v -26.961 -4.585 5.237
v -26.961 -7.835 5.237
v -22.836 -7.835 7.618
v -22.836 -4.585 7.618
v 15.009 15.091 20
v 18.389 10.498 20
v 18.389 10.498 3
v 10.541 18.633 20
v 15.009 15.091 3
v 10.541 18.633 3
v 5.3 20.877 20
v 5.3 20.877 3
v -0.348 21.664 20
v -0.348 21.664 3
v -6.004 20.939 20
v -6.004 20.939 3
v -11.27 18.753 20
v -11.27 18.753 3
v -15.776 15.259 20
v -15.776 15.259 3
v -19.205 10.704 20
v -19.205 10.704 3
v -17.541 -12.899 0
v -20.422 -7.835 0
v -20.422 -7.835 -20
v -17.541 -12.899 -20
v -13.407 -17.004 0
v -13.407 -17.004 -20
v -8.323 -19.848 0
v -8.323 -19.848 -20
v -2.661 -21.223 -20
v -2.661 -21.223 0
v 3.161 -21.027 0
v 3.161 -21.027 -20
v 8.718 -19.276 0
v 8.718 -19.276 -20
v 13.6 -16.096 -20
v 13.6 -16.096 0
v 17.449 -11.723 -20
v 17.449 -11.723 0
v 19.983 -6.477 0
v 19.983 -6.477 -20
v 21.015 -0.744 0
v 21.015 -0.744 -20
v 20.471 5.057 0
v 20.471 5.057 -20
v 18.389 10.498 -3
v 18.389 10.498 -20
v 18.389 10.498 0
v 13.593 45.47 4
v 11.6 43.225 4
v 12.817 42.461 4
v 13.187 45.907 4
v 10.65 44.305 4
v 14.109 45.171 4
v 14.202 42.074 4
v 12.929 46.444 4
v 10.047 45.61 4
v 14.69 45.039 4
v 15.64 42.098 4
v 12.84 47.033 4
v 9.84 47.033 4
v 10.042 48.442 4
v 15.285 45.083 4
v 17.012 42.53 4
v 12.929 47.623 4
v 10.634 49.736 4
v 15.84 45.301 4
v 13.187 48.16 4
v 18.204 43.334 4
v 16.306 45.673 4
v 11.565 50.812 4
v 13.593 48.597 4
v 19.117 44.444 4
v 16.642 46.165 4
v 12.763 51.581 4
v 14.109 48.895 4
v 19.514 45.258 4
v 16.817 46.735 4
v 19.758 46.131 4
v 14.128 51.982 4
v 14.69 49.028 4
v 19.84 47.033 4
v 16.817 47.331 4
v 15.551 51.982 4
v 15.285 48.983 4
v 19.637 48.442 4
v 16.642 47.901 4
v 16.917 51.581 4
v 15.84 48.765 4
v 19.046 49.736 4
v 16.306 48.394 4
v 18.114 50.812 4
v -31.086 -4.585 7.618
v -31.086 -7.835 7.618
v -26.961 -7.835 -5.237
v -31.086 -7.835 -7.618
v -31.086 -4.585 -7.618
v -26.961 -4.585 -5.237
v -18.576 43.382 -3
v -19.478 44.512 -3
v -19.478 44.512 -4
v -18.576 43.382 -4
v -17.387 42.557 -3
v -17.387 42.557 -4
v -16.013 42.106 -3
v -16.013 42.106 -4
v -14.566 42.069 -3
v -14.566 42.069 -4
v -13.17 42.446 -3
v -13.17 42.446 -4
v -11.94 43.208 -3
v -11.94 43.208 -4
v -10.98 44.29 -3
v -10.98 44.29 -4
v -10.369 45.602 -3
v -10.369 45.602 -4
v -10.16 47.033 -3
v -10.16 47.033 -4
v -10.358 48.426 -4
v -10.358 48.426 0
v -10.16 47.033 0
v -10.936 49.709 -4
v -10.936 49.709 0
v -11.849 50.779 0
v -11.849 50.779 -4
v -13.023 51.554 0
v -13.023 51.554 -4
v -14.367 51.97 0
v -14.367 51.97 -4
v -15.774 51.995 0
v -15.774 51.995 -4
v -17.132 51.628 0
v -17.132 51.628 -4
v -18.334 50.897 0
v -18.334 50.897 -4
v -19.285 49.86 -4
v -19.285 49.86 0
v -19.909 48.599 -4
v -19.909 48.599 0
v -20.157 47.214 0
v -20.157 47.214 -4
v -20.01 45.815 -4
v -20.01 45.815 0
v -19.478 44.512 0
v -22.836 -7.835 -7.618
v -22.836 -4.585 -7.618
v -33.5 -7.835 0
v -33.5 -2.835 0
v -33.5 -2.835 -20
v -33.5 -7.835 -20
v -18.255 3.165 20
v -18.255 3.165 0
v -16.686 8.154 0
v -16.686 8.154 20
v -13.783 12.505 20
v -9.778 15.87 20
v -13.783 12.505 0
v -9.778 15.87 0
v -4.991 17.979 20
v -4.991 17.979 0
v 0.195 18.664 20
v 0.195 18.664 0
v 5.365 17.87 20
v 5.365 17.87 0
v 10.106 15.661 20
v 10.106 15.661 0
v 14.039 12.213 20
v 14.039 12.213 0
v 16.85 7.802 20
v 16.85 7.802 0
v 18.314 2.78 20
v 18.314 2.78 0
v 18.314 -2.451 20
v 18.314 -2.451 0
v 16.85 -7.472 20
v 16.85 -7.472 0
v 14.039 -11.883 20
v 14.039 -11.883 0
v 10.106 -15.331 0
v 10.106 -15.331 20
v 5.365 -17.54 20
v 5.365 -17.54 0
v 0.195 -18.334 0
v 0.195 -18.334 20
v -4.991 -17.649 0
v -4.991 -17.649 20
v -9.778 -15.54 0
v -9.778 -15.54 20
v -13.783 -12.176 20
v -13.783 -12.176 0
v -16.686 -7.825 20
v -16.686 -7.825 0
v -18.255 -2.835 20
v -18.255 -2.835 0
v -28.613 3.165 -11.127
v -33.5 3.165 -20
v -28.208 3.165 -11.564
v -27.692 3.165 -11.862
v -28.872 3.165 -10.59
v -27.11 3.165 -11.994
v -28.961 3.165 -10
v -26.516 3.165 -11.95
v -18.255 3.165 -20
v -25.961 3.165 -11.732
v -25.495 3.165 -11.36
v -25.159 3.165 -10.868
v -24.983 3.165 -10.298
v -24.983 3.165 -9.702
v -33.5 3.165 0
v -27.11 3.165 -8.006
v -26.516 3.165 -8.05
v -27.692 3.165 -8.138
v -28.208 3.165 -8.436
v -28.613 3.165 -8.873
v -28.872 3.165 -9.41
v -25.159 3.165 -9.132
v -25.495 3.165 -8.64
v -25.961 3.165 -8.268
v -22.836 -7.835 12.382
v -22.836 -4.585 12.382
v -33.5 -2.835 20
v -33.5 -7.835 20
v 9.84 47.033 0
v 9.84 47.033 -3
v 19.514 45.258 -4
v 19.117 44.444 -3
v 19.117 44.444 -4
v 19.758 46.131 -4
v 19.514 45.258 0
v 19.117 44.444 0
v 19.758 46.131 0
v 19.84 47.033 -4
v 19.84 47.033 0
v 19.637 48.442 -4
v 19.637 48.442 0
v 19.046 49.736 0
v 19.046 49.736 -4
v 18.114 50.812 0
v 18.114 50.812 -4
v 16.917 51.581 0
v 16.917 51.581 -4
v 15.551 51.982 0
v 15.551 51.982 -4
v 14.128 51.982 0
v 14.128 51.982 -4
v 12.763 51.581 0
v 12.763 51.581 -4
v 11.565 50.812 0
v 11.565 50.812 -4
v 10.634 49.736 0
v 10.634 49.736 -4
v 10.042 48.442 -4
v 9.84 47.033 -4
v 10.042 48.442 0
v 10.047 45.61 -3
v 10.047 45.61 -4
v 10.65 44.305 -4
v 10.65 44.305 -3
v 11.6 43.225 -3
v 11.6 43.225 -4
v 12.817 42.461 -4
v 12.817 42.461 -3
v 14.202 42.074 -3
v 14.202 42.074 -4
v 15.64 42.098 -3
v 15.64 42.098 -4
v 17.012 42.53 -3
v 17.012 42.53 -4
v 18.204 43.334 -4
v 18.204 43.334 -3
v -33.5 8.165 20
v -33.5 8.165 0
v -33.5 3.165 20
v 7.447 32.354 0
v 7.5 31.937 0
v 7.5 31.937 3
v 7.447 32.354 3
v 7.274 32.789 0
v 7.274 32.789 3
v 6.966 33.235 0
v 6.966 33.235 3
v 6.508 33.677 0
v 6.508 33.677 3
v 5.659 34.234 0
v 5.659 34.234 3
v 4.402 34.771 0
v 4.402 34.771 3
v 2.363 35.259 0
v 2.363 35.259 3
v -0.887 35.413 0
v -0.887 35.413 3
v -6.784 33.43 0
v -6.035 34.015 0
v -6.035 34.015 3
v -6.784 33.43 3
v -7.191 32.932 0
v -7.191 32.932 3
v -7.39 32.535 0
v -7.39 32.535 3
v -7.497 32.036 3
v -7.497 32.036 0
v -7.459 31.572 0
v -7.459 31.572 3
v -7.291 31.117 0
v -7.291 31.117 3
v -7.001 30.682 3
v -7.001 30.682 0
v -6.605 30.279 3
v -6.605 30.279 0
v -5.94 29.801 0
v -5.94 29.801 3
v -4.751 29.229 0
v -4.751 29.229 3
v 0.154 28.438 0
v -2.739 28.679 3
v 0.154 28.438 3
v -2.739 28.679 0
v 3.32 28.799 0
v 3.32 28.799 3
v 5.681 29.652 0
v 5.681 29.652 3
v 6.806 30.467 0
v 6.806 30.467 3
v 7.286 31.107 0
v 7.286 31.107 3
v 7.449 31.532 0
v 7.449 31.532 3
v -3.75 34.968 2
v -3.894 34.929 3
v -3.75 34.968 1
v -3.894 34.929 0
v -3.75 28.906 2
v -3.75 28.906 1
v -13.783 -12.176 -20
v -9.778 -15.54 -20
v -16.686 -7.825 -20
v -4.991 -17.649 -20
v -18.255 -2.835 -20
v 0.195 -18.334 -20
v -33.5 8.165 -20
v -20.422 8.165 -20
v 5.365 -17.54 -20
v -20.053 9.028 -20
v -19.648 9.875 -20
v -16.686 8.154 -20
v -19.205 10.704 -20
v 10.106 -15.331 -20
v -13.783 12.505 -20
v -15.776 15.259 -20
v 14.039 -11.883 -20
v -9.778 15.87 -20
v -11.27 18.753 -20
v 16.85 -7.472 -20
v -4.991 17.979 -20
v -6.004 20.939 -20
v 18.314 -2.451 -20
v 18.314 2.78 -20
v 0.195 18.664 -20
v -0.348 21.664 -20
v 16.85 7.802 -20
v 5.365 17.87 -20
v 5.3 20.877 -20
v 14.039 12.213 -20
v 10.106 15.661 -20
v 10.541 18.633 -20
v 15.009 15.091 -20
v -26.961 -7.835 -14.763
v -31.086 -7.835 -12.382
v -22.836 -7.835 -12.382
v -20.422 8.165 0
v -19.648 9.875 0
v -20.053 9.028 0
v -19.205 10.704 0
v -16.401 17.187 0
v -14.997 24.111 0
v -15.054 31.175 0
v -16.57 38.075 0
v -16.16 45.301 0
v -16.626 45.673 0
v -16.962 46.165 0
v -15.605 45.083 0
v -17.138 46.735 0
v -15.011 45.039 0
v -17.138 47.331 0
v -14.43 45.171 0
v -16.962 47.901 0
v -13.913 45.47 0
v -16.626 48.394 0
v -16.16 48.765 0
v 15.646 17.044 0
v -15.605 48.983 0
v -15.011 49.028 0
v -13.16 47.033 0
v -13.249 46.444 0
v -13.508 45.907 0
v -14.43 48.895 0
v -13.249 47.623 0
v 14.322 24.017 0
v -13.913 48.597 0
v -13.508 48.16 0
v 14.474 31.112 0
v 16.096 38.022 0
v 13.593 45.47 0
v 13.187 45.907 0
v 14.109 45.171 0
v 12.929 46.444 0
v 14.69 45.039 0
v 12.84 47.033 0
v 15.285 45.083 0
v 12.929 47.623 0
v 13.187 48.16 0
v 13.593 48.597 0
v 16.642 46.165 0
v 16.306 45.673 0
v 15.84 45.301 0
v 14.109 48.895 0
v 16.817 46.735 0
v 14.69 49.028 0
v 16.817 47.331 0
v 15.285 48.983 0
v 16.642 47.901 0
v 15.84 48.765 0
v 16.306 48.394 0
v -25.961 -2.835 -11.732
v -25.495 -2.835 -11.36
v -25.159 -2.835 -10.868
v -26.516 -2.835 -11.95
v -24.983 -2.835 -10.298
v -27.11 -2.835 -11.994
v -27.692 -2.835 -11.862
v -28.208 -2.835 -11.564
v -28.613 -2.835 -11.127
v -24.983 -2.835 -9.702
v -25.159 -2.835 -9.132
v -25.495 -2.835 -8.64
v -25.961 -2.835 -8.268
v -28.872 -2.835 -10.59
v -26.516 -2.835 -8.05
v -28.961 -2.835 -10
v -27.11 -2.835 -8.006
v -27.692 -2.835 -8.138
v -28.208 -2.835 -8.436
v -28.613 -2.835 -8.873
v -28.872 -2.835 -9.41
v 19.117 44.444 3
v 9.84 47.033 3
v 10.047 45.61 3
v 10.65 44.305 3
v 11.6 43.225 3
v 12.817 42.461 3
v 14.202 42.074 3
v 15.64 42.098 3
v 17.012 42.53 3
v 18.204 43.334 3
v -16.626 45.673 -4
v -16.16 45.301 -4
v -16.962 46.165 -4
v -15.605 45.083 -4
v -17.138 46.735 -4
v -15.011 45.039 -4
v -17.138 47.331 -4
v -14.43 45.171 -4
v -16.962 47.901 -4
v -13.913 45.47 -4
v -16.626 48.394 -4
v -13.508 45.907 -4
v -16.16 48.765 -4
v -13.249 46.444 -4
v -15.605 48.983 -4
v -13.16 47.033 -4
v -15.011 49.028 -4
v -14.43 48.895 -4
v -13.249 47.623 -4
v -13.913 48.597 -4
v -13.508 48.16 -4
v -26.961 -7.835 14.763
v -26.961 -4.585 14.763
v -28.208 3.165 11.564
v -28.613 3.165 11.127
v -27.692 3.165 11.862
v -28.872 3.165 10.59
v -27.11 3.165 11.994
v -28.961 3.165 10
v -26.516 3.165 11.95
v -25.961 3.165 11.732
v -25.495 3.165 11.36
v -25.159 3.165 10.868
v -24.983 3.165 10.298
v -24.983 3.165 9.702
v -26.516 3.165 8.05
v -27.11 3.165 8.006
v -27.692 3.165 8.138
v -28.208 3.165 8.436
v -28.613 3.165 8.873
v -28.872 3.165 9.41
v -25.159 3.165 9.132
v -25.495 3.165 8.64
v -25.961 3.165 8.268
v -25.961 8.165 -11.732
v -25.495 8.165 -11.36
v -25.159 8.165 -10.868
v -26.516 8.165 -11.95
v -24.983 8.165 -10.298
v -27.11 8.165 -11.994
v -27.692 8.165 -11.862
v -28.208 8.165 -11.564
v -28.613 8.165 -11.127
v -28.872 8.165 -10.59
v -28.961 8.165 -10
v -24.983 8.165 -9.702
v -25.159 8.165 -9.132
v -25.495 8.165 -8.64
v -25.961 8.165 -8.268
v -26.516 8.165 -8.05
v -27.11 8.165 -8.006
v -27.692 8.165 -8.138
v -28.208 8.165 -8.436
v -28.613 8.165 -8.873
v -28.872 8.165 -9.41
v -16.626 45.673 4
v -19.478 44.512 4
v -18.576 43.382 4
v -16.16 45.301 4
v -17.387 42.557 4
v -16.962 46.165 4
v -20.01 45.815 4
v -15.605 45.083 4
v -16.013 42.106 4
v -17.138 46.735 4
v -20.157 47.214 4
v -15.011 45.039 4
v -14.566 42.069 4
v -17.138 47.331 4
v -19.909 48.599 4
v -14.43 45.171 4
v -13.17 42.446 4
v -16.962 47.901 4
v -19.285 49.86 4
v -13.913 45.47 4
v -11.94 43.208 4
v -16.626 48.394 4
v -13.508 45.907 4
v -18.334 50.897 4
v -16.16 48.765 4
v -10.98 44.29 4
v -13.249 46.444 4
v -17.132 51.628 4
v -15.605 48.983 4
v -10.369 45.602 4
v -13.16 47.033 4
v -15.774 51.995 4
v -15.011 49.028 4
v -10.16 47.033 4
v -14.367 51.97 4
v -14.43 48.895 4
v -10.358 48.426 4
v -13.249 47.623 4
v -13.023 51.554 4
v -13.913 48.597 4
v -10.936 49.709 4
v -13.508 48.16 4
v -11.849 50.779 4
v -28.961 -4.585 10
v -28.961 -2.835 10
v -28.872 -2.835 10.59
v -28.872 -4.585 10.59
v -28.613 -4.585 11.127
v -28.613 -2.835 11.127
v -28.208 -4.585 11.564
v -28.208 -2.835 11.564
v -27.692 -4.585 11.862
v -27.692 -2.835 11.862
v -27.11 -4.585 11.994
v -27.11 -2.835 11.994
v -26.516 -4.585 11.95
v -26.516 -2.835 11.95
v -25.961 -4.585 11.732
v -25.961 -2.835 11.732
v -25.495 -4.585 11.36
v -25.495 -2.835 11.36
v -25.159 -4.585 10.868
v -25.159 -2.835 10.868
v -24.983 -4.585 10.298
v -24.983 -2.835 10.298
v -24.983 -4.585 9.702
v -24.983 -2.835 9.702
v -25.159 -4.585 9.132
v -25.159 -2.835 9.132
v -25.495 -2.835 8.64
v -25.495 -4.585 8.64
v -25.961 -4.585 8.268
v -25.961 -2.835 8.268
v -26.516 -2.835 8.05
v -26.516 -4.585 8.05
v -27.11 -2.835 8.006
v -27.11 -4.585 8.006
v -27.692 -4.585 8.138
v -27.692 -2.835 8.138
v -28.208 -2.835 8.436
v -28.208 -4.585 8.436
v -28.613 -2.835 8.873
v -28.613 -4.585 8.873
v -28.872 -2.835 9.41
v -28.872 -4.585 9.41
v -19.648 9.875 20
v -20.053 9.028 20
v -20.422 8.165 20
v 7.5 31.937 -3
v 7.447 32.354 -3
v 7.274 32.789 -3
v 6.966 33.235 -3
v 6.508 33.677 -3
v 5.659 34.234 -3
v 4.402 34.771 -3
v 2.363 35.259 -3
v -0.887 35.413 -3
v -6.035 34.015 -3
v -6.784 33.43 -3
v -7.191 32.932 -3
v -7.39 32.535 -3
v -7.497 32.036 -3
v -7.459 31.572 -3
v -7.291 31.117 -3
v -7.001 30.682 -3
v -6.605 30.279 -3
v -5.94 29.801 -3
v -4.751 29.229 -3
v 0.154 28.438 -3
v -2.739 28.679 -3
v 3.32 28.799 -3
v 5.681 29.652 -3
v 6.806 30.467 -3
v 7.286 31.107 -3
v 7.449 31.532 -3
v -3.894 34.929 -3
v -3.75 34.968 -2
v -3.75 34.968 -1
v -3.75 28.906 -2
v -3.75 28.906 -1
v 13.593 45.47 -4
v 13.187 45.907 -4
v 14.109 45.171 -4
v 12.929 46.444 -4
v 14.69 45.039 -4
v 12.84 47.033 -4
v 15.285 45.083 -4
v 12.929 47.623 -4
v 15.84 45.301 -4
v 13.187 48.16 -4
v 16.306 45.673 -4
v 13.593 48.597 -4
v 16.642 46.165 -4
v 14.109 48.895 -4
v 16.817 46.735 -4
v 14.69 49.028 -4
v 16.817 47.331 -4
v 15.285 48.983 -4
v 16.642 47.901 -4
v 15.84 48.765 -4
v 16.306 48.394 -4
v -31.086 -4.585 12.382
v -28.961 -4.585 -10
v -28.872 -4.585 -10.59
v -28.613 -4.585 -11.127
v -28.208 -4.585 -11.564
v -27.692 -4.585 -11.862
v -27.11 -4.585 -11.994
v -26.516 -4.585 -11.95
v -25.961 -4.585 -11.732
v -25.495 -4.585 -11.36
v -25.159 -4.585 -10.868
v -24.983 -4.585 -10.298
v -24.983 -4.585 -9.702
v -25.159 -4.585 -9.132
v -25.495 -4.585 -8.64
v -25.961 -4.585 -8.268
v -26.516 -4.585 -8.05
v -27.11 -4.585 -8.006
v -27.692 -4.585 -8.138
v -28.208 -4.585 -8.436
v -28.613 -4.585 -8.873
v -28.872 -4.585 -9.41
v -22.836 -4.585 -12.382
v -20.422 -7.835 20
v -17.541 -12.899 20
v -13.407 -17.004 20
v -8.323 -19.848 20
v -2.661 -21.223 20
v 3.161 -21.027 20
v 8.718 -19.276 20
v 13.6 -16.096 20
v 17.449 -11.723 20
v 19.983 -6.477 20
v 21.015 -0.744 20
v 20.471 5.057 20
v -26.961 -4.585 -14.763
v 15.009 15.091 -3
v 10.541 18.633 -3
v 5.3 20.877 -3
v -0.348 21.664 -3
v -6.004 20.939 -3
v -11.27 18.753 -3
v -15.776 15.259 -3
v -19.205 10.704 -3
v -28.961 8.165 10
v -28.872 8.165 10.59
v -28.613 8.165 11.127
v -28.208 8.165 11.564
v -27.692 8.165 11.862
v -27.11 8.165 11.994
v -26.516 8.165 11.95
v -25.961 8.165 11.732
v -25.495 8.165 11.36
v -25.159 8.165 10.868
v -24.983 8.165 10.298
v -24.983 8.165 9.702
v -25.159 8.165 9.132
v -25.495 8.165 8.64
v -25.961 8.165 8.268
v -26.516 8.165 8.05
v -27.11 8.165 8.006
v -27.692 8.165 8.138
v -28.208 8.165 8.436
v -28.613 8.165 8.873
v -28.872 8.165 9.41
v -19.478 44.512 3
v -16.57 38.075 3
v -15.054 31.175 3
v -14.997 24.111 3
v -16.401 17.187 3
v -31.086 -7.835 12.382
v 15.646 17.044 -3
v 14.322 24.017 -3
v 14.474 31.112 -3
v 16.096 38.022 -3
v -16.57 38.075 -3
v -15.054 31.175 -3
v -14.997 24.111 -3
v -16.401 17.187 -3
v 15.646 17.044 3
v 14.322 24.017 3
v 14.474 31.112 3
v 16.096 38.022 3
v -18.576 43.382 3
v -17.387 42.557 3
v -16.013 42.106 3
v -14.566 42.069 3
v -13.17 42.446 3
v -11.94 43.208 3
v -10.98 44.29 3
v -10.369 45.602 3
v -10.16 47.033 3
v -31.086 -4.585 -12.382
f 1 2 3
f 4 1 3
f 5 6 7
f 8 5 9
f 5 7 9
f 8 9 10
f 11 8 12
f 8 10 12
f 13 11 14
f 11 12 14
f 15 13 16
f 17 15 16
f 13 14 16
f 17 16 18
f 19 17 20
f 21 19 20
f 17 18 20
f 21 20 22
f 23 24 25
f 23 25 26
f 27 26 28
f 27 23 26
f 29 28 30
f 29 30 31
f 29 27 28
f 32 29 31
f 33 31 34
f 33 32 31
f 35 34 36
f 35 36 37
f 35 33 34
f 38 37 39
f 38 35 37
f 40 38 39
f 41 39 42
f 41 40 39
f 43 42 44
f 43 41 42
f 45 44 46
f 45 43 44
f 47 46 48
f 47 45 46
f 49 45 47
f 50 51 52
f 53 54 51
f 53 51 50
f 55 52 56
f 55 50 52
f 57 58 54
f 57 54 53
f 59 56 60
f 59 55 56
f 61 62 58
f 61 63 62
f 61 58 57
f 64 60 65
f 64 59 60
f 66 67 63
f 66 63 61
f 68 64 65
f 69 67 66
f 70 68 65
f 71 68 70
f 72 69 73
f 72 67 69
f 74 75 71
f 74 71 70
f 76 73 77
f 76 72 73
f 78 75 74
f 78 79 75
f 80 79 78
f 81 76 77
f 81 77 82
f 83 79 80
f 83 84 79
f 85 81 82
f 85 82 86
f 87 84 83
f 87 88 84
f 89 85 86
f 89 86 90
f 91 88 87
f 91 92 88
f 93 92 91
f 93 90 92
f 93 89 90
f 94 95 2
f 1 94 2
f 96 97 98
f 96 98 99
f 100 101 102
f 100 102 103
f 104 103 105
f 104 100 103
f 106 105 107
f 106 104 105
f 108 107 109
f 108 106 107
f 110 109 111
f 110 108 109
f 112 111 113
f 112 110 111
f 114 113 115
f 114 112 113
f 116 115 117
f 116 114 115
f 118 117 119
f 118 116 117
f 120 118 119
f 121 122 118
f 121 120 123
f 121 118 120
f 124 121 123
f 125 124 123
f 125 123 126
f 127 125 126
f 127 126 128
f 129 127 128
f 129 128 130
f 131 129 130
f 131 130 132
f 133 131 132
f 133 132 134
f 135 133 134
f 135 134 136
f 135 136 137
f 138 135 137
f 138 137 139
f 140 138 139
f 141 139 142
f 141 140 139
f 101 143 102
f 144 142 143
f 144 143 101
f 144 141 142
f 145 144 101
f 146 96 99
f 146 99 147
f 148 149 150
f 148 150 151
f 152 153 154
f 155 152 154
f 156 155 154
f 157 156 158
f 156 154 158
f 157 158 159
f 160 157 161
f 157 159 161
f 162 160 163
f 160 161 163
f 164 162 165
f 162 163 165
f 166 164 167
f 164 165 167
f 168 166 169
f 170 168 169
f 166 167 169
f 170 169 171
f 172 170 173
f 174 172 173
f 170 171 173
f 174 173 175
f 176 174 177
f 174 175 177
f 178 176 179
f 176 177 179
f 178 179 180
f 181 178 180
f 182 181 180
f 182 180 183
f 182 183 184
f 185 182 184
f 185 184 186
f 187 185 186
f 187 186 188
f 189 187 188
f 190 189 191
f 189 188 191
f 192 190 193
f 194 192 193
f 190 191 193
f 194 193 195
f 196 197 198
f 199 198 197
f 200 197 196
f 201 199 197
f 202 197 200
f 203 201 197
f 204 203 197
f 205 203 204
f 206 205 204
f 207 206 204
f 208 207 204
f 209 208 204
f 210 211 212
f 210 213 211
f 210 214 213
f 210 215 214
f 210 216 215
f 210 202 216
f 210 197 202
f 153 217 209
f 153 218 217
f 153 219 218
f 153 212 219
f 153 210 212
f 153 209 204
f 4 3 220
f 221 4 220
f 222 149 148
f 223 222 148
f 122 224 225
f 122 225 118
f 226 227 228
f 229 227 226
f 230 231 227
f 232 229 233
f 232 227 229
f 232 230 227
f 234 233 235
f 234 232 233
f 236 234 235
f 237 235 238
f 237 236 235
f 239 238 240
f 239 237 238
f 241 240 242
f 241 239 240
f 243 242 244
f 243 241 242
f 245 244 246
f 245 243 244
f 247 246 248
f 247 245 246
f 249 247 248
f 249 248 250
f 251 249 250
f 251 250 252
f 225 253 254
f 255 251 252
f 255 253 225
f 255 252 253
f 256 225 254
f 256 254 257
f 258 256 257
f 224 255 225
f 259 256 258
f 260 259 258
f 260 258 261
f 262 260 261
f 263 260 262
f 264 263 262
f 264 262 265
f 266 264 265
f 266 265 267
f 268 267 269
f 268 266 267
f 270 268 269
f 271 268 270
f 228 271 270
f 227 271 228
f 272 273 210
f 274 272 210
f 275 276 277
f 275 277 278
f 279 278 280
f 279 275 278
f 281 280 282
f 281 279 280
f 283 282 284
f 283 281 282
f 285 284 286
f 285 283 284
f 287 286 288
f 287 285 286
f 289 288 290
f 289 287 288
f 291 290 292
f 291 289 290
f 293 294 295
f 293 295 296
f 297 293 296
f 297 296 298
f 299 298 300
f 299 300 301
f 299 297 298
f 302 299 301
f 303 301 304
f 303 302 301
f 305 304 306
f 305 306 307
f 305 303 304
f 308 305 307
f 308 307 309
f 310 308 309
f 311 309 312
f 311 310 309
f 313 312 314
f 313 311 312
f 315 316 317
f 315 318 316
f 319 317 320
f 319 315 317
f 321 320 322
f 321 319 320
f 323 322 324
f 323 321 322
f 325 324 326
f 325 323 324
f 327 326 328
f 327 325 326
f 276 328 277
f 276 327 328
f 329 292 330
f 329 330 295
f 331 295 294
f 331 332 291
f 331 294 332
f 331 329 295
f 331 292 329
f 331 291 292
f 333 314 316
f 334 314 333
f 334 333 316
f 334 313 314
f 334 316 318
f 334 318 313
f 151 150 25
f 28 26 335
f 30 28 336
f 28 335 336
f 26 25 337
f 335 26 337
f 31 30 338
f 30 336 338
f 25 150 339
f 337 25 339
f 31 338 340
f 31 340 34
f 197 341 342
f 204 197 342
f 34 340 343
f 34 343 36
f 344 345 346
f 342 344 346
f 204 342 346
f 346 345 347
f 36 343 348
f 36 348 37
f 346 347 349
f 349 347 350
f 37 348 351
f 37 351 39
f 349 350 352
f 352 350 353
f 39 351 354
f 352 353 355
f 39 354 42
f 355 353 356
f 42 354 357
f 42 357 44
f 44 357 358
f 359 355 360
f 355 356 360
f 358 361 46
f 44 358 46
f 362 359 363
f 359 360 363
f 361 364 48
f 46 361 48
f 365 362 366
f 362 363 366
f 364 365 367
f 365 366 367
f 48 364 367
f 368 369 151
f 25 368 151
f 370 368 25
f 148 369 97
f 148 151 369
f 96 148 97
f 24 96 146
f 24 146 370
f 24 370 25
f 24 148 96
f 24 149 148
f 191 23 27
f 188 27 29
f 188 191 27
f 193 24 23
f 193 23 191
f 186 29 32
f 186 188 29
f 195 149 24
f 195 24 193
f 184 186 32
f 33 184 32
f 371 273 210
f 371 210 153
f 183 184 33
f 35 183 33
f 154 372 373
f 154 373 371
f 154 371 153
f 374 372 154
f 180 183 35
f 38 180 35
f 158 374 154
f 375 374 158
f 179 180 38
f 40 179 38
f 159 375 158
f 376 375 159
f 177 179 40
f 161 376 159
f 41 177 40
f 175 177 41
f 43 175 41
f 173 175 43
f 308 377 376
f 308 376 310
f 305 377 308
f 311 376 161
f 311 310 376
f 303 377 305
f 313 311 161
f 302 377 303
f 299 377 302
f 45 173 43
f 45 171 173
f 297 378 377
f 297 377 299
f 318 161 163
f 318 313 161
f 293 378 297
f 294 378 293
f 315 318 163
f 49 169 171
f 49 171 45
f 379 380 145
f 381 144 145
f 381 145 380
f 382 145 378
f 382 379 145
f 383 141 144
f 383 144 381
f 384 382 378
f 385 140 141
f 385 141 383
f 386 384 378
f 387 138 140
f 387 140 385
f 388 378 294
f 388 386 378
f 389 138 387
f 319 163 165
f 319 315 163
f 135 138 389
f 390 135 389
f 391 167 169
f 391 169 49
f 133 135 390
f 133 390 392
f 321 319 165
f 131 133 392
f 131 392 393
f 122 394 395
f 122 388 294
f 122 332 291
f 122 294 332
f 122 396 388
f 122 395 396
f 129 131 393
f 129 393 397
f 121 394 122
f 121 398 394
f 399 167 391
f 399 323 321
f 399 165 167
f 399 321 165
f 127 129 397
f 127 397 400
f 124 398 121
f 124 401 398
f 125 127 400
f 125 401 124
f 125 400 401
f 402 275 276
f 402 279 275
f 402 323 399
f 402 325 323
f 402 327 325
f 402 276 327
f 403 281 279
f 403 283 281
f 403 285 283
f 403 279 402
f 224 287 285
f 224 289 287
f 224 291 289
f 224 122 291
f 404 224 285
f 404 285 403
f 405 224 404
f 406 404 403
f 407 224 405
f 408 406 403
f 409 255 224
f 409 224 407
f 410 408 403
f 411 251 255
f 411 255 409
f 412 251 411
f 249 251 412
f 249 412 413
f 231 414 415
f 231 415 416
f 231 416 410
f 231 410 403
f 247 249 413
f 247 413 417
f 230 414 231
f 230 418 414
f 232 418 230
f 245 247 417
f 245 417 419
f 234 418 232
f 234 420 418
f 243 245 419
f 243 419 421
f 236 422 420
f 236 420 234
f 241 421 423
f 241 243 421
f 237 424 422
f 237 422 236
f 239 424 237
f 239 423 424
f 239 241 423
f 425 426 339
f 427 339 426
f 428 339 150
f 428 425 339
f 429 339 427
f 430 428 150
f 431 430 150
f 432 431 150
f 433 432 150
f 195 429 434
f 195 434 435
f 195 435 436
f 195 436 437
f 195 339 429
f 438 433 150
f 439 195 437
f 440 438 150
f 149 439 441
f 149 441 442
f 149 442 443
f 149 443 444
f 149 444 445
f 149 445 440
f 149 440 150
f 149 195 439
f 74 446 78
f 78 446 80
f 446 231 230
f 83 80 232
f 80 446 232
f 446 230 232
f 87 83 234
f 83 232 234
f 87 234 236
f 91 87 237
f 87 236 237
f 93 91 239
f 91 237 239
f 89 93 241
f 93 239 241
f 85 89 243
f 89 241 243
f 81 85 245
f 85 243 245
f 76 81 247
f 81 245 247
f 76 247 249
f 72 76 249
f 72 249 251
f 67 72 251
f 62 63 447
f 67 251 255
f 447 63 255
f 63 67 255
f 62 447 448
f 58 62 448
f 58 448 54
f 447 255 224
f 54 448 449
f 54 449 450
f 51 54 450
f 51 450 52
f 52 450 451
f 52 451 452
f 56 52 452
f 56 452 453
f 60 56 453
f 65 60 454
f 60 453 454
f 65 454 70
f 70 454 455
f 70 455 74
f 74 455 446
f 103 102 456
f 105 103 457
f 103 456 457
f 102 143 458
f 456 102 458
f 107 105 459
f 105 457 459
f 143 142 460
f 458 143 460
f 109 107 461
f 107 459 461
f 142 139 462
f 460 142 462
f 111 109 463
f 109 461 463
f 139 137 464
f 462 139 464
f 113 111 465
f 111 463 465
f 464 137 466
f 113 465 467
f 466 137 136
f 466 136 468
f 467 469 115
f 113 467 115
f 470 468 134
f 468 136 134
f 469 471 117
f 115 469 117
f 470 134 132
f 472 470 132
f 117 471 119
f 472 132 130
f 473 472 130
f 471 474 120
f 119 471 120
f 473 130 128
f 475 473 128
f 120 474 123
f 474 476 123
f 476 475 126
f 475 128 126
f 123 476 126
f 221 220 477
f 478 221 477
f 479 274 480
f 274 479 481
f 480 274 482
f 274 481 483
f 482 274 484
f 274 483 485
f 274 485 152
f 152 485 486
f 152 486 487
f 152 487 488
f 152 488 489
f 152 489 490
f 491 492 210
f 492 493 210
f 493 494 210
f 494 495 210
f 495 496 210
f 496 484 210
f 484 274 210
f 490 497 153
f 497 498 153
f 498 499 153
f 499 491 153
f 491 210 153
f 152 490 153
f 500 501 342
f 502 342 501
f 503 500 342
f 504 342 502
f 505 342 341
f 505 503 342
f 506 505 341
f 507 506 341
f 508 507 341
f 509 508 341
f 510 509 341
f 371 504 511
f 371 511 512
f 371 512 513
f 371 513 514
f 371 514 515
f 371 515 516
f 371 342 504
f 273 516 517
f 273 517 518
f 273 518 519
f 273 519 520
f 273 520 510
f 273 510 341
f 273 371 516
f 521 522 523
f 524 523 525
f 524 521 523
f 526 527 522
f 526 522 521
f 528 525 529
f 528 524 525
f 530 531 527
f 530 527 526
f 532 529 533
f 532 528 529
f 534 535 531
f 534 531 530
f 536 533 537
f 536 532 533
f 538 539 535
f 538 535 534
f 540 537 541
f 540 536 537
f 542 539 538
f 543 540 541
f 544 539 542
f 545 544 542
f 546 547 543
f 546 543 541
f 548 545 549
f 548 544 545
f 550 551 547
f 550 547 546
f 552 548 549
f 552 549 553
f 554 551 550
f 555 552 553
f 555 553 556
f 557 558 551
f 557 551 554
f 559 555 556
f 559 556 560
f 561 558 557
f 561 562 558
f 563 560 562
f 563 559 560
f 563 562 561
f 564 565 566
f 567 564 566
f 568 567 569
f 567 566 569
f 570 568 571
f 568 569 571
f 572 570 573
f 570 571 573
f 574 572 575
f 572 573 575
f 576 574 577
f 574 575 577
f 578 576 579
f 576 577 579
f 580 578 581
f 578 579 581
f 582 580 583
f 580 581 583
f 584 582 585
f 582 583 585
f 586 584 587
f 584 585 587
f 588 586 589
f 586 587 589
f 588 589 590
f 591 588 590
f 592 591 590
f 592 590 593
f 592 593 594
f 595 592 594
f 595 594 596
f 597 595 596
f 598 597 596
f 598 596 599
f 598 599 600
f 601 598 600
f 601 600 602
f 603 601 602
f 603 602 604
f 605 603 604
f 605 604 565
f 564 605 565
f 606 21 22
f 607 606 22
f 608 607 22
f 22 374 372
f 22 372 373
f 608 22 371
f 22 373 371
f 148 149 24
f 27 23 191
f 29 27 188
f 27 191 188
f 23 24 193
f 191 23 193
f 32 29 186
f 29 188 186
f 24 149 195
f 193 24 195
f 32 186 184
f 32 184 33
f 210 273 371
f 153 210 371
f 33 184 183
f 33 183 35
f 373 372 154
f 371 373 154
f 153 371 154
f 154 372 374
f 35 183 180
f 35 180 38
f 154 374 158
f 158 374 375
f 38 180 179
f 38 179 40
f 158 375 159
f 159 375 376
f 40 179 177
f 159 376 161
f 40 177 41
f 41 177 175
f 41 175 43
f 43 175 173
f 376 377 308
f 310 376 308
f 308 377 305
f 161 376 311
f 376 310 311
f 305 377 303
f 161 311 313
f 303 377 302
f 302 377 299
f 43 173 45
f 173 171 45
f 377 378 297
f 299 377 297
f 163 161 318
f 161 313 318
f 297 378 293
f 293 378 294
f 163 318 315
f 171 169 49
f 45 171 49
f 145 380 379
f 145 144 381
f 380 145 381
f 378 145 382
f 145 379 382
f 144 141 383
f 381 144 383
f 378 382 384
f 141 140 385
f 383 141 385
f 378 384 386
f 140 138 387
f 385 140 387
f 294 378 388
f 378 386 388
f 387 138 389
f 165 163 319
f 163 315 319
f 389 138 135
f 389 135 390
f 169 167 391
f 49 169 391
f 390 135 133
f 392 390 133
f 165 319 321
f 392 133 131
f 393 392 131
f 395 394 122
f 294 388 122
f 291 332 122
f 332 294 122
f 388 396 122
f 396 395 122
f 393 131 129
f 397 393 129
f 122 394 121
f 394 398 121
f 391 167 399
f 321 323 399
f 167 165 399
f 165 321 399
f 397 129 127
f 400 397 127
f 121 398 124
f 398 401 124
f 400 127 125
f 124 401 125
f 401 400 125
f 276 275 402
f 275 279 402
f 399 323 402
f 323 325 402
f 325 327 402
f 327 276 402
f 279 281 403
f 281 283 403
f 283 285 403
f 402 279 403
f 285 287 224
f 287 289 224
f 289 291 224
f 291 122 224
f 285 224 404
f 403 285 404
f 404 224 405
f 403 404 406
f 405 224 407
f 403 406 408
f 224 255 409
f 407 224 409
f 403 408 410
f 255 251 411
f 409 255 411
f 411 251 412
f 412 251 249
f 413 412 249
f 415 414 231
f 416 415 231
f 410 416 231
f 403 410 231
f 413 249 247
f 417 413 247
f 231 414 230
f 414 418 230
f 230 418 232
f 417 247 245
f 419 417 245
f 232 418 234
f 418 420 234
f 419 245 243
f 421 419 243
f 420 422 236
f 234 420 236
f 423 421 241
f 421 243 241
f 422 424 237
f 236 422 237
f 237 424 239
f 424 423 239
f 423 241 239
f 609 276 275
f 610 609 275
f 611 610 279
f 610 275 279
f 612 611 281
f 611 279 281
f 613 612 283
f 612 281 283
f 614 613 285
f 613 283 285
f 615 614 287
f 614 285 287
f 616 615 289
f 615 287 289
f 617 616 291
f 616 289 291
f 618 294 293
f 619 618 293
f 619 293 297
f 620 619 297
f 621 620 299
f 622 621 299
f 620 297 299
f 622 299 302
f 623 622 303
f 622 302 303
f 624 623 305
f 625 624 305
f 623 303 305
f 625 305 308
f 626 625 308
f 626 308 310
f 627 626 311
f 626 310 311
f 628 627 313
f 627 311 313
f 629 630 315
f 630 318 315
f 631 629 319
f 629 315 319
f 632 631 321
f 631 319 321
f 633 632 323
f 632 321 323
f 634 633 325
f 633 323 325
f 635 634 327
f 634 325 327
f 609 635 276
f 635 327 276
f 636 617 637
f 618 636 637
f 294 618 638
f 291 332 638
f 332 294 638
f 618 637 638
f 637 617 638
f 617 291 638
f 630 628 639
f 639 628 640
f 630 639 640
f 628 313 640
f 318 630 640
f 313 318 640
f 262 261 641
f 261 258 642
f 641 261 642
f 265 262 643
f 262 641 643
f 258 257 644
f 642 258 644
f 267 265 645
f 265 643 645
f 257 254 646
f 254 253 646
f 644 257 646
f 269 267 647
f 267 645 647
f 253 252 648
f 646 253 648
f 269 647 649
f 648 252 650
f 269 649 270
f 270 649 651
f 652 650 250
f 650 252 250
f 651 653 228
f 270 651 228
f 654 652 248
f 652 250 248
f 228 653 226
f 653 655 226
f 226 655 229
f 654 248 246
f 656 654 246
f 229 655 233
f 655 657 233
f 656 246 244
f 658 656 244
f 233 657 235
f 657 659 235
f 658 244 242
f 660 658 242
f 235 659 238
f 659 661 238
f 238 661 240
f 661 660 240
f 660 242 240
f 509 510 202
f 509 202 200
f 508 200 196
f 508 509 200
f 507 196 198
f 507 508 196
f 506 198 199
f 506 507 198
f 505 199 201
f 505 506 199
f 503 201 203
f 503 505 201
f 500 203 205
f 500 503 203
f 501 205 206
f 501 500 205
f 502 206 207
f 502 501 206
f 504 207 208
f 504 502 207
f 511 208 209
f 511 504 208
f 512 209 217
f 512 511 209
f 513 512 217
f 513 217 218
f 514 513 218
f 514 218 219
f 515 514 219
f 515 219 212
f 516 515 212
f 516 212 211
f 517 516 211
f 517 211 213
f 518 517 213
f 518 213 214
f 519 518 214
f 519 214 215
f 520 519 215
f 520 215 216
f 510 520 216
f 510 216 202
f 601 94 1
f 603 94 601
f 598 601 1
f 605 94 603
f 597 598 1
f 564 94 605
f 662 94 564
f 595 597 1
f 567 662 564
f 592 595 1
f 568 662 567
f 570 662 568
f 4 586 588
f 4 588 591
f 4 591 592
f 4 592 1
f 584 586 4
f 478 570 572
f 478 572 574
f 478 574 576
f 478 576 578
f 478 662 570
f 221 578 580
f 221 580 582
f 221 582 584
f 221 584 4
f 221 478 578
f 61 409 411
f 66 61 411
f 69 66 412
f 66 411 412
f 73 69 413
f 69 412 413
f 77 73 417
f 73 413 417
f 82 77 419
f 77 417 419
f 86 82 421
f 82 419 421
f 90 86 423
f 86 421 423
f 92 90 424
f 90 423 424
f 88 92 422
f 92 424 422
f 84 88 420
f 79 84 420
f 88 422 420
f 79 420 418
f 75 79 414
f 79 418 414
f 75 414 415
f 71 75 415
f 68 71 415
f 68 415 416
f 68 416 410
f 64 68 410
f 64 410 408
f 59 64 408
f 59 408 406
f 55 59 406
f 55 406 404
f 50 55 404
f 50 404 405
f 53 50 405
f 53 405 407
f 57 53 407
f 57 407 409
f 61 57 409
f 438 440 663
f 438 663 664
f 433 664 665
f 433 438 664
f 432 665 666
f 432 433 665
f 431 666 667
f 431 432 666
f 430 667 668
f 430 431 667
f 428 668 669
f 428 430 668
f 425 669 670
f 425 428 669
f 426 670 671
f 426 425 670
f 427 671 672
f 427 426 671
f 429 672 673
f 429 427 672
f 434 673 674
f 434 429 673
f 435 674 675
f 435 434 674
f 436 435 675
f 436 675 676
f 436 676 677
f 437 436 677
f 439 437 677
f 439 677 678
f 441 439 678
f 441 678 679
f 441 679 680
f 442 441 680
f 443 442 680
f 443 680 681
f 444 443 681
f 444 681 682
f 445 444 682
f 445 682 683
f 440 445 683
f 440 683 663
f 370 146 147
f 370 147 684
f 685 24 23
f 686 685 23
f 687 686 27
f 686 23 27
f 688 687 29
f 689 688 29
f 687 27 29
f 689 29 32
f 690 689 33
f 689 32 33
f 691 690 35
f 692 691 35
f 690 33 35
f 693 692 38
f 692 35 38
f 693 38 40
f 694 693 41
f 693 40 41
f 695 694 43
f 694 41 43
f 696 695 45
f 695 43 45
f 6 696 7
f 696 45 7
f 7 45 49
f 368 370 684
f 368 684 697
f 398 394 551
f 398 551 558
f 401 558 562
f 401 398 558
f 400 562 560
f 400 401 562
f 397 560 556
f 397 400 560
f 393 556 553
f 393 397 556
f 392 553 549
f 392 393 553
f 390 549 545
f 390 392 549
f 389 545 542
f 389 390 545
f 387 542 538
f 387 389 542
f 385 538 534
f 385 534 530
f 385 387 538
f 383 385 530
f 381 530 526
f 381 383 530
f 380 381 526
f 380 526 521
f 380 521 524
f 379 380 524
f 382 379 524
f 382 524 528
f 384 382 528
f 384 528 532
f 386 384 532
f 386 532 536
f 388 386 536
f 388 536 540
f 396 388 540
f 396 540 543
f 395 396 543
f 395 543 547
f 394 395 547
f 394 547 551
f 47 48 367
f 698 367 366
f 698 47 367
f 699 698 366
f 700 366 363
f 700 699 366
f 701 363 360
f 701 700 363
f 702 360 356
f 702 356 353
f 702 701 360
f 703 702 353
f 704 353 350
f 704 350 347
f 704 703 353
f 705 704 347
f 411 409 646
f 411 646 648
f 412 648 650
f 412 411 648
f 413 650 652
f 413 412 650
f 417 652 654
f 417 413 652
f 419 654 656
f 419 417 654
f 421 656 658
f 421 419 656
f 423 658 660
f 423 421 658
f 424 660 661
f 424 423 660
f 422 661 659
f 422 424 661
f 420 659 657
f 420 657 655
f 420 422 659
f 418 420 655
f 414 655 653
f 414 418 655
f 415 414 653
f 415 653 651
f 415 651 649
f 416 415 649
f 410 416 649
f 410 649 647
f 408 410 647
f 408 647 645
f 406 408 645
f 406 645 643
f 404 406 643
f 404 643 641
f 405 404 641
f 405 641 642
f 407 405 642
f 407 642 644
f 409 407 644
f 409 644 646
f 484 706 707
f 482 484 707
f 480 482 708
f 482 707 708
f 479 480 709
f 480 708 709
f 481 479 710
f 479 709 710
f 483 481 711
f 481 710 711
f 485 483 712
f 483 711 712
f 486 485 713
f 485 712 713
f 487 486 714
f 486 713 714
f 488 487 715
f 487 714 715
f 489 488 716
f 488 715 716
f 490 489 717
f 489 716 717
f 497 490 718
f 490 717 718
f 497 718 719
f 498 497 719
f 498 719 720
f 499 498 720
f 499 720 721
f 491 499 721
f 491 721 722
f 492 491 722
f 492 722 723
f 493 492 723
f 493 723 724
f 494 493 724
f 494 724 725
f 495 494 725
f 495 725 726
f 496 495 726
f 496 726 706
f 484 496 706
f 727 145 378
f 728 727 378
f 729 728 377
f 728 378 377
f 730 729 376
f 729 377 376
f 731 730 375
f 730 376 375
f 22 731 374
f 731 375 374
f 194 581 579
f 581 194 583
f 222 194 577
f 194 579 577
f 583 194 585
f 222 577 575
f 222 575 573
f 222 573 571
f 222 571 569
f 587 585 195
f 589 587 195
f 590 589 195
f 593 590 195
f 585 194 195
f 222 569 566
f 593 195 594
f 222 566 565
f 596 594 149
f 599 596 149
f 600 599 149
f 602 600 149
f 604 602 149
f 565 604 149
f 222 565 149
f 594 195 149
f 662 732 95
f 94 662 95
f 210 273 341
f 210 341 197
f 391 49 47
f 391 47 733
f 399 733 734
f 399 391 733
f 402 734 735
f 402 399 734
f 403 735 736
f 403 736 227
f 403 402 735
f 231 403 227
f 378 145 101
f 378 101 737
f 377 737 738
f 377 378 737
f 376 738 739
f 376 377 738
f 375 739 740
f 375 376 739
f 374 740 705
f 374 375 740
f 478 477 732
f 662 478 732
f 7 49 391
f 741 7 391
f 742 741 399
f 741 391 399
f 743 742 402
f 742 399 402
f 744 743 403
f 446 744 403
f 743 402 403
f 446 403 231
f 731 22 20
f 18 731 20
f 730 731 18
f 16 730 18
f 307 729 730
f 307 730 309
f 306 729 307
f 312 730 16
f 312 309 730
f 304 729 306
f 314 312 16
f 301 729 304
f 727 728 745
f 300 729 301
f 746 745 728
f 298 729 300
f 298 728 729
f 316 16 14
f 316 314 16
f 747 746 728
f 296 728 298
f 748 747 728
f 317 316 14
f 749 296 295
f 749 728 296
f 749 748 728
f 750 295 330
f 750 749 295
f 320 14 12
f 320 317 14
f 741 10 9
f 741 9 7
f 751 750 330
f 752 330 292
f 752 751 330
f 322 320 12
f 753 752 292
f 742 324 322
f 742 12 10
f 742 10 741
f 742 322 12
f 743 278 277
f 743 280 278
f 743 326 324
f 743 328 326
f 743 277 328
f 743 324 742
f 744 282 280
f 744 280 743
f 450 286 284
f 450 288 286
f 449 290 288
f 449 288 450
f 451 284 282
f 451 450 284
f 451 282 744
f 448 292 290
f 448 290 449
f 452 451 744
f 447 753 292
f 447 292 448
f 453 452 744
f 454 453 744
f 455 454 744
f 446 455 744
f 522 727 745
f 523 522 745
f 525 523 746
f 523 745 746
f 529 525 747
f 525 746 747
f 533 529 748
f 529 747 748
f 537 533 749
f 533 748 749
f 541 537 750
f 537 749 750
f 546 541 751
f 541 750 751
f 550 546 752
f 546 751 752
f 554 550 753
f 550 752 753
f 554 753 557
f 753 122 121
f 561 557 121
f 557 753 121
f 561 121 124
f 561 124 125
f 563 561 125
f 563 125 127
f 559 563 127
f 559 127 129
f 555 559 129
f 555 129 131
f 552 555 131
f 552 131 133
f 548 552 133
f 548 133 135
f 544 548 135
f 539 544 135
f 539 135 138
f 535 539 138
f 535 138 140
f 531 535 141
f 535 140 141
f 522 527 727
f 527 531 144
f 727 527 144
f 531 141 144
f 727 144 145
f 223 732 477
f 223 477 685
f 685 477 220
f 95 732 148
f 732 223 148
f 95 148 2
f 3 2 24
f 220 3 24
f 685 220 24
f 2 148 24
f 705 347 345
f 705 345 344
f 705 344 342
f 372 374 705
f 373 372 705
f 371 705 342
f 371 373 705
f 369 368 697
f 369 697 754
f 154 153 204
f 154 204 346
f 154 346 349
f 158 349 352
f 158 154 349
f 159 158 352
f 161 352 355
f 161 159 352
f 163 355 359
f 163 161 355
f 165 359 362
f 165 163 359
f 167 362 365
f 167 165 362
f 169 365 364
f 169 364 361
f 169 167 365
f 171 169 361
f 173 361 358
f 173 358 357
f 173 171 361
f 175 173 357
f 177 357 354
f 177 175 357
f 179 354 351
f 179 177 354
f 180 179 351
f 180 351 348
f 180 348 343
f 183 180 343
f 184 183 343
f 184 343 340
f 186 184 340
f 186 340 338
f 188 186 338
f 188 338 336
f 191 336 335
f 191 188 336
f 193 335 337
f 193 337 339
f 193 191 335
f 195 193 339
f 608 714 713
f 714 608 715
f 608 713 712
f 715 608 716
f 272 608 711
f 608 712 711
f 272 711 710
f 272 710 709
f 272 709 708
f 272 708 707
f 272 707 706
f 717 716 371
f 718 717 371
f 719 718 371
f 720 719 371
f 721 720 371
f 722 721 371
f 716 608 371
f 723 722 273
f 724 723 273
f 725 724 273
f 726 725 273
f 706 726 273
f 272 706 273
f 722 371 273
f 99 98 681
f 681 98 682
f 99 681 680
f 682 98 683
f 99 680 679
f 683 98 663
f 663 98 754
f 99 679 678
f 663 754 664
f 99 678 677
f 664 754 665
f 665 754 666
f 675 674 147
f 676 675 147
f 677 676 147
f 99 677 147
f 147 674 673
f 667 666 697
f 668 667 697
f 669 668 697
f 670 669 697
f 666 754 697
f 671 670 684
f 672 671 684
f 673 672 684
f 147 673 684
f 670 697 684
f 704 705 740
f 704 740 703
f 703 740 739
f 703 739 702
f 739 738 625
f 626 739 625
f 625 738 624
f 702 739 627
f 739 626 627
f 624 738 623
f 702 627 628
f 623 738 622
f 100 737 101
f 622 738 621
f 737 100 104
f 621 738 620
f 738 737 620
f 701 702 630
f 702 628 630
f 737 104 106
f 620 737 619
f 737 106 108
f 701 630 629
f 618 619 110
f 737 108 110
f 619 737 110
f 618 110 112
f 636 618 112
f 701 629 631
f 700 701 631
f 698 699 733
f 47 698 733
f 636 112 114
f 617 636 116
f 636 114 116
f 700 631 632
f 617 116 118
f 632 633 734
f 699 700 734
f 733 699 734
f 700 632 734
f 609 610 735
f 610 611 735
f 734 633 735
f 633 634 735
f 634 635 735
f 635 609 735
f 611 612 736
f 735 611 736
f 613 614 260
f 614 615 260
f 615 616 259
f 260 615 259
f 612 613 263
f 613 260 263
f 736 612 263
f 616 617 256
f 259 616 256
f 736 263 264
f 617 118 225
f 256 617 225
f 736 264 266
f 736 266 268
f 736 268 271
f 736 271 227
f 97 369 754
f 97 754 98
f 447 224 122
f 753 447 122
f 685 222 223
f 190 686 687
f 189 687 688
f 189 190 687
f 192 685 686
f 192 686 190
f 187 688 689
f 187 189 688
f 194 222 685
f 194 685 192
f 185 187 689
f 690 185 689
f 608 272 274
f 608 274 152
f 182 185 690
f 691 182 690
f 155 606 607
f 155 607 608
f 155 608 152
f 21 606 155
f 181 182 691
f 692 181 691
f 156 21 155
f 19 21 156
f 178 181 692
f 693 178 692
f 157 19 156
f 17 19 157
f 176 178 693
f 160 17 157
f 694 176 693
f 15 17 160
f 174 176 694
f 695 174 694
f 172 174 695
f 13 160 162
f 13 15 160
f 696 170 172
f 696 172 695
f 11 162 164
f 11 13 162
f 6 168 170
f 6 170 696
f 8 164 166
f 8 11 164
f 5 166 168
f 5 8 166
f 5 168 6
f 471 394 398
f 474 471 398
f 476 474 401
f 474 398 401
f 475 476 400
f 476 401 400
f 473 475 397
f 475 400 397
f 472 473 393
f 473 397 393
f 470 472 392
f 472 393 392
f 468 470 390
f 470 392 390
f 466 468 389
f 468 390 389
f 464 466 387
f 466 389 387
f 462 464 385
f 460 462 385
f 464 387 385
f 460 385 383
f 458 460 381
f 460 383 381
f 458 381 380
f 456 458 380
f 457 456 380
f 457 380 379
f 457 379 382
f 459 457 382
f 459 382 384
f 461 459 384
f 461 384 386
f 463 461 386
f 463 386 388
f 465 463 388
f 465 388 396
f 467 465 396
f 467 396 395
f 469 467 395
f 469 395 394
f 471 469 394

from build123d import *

# Parameters (mm, degrees)
F1_DEPTH = 20
F0_R     = 2
F2_DEPTH = 3
F3_DEPTH = 4
F5_DEPTH = 3.25
F6_R     = 2
F7_DEPTH = 29.5010001


# Not quite as in the source:
# - a feature names something its author has since deleted; it is built from what else it names


with BuildPart() as f1:
    # F0 (on Top) → F1 (new body)
    with BuildSketch(Plane.XY):
        with BuildLine():
            ThreePointArc((-18.2551362635, 3.1646558729), (18.5, 0.1646558729), (-18.2551362635, -2.8353441271))
            Line((-18.2551362635, -2.8353441271), (-21.289668856, -2.8353441271))
            Line((-21.289668856, -2.8353441271), (-33.5, -2.8353441271))
            Line((-33.5, -2.8353441271), (-33.5, -5.8353441271))
            Line((-33.5, -5.8353441271), (-33.5, -7.8353441271))
            Line((-33.5, -7.8353441271), (-20.4217309456, -7.8353441271))
            ThreePointArc((-20.4217309456, -7.8353441271), (8.7176252261, -19.2755005117), (18.3885107603, 10.4978639134))
            ThreePointArc((18.3885107603, 10.4978639134), (-0.3478610365, 21.6643338769), (-19.2053350681, 10.7036152553))
            ThreePointArc((-19.2053350681, 10.7036152553), (-19.8551354356, 9.4540669672), (-20.4217309456, 8.1646558729))
            Line((-20.4217309456, 8.1646558729), (-33.5, 8.1646558729))
            Line((-33.5, 8.1646558729), (-33.5, 6.1646558729))
            Line((-33.5, 6.1646558729), (-33.5, 3.1646558729))
            Line((-33.5, 3.1646558729), (-21.289668856, 3.1646558729))
            Line((-21.289668856, 3.1646558729), (-18.2551362635, 3.1646558729))
        make_face()
    extrude(amount=F1_DEPTH)

    # F0 (on Top) → F2 (join)
    with BuildSketch(Plane.XY):
        with BuildLine():
            ThreePointArc((-19.2053350681, 10.7036152553), (-0.3478610365, 21.6643338769), (18.3885107603, 10.4978639134))
            ThreePointArc((18.3885107603, 10.4978639134), (14.2120337074, 27.5685018888), (19.1172770705, 44.4441716239))
            ThreePointArc((19.1172770705, 44.4441716239), (13.4958098431, 42.2172179553), (9.8397882001, 47.0332040616))
            Line((9.8397882001, 47.0332040616), (-10.1602117999, 47.0332040616))
            ThreePointArc((-10.1602117999, 47.0332040616), (-13.8544265436, 42.2067224379), (-19.4781817457, 44.512264644))
            ThreePointArc((-19.4781817457, 44.512264644), (-14.8414845345, 27.6442586076), (-19.2053350681, 10.7036152553))
        make_face()
        with BuildLine():
            add(Edge.make_bspline(
                [(7.5, 31.9373905659), (7.5, 37.9995683924), (-3.75, 34.9684794791), (-15, 31.9373905659), (-3.75, 28.9063016526), (7.5, 25.8752127394), (7.5, 31.9373905659)],
                knots=[0, 0, 0, 2.0943951024, 2.0943951024, 4.1887902048, 4.1887902048, 6.2831853072, 6.2831853072, 6.2831853072], degree=2, weights=[1, 0.5, 1, 0.5, 1, 0.5, 1]))
        make_face(mode=Mode.SUBTRACT)
        with BuildLine():
            ThreePointArc((-10.1602117999, 47.0332040616), (-16.4659970562, 51.8596856854), (-19.4781817457, 44.512264644))
            ThreePointArc((-19.4781817457, 44.512264644), (-13.8544265436, 42.2067224379), (-10.1602117999, 47.0332040616))
        make_face()
        with Locations((-15.1602117999, 47.0332040616)):
            Circle(F0_R, mode=Mode.SUBTRACT)
        with BuildLine():
            ThreePointArc((9.8397882001, 47.0332040616), (13.4958098431, 42.2172179553), (19.1172770705, 44.4441716239))
            ThreePointArc((19.1172770705, 44.4441716239), (19.6557743064, 45.6892257046), (19.8397882001, 47.0332040616))
            ThreePointArc((19.8397882001, 47.0332040616), (14.8397882001, 52.0332040616), (9.8397882001, 47.0332040616))
        make_face()
        with BuildLine():
            ThreePointArc((16.8397882001, 47.0332040616), (14.8397882001, 45.0332040616), (12.8397882001, 47.0332040616))
            ThreePointArc((12.8397882001, 47.0332040616), (14.8397882001, 49.0332040616), (16.8397882001, 47.0332040616))
        make_face(mode=Mode.SUBTRACT)
    extrude(amount=F2_DEPTH)

    # F0 (on Top) → F3 (join)
    with BuildSketch(Plane.XY):
        with BuildLine():
            ThreePointArc((-10.1602117999, 47.0332040616), (-16.4659970562, 51.8596856854), (-19.4781817457, 44.512264644))
            ThreePointArc((-19.4781817457, 44.512264644), (-13.8544265436, 42.2067224379), (-10.1602117999, 47.0332040616))
        make_face()
        with Locations((-15.1602117999, 47.0332040616)):
            Circle(F0_R, mode=Mode.SUBTRACT)
        with BuildLine():
            ThreePointArc((9.8397882001, 47.0332040616), (13.4958098431, 42.2172179553), (19.1172770705, 44.4441716239))
            ThreePointArc((19.1172770705, 44.4441716239), (19.6557743064, 45.6892257046), (19.8397882001, 47.0332040616))
            ThreePointArc((19.8397882001, 47.0332040616), (14.8397882001, 52.0332040616), (9.8397882001, 47.0332040616))
        make_face()
        with BuildLine():
            ThreePointArc((16.8397882001, 47.0332040616), (14.8397882001, 45.0332040616), (12.8397882001, 47.0332040616))
            ThreePointArc((12.8397882001, 47.0332040616), (14.8397882001, 49.0332040616), (16.8397882001, 47.0332040616))
        make_face(mode=Mode.SUBTRACT)
    extrude(amount=F3_DEPTH)

    # F4 (on face) → F5 (cut)
    with BuildSketch(Plane.XZ.offset(7.8353441271)):
        Polygon((-31.0858654728, 12.3815698604), (-31.0858654728, 7.6184301396), (-26.9608654728, 5.2368602792), (-22.8358654728, 7.6184301396), (-22.8358654728, 12.3815698604), (-26.9608654728, 14.7631397208), align=None)
    extrude(amount=-F5_DEPTH, mode=Mode.SUBTRACT)

    # F6 (on face) → F7 (cut, through all)
    with BuildSketch(Plane(origin=(0, 8.1646558729, 0), x_dir=(-1, 0, 0), z_dir=(0, 1, 0))):
        with Locations((26.9608654728, 10)):
            Circle(F6_R)
    extrude(amount=-F7_DEPTH, mode=Mode.SUBTRACT)


with BuildPart() as f8_1:
    # F8: instance of F1
    add(f1.part.mirror(Plane.XY))


solid = Compound([f1.part, f8_1.part])
